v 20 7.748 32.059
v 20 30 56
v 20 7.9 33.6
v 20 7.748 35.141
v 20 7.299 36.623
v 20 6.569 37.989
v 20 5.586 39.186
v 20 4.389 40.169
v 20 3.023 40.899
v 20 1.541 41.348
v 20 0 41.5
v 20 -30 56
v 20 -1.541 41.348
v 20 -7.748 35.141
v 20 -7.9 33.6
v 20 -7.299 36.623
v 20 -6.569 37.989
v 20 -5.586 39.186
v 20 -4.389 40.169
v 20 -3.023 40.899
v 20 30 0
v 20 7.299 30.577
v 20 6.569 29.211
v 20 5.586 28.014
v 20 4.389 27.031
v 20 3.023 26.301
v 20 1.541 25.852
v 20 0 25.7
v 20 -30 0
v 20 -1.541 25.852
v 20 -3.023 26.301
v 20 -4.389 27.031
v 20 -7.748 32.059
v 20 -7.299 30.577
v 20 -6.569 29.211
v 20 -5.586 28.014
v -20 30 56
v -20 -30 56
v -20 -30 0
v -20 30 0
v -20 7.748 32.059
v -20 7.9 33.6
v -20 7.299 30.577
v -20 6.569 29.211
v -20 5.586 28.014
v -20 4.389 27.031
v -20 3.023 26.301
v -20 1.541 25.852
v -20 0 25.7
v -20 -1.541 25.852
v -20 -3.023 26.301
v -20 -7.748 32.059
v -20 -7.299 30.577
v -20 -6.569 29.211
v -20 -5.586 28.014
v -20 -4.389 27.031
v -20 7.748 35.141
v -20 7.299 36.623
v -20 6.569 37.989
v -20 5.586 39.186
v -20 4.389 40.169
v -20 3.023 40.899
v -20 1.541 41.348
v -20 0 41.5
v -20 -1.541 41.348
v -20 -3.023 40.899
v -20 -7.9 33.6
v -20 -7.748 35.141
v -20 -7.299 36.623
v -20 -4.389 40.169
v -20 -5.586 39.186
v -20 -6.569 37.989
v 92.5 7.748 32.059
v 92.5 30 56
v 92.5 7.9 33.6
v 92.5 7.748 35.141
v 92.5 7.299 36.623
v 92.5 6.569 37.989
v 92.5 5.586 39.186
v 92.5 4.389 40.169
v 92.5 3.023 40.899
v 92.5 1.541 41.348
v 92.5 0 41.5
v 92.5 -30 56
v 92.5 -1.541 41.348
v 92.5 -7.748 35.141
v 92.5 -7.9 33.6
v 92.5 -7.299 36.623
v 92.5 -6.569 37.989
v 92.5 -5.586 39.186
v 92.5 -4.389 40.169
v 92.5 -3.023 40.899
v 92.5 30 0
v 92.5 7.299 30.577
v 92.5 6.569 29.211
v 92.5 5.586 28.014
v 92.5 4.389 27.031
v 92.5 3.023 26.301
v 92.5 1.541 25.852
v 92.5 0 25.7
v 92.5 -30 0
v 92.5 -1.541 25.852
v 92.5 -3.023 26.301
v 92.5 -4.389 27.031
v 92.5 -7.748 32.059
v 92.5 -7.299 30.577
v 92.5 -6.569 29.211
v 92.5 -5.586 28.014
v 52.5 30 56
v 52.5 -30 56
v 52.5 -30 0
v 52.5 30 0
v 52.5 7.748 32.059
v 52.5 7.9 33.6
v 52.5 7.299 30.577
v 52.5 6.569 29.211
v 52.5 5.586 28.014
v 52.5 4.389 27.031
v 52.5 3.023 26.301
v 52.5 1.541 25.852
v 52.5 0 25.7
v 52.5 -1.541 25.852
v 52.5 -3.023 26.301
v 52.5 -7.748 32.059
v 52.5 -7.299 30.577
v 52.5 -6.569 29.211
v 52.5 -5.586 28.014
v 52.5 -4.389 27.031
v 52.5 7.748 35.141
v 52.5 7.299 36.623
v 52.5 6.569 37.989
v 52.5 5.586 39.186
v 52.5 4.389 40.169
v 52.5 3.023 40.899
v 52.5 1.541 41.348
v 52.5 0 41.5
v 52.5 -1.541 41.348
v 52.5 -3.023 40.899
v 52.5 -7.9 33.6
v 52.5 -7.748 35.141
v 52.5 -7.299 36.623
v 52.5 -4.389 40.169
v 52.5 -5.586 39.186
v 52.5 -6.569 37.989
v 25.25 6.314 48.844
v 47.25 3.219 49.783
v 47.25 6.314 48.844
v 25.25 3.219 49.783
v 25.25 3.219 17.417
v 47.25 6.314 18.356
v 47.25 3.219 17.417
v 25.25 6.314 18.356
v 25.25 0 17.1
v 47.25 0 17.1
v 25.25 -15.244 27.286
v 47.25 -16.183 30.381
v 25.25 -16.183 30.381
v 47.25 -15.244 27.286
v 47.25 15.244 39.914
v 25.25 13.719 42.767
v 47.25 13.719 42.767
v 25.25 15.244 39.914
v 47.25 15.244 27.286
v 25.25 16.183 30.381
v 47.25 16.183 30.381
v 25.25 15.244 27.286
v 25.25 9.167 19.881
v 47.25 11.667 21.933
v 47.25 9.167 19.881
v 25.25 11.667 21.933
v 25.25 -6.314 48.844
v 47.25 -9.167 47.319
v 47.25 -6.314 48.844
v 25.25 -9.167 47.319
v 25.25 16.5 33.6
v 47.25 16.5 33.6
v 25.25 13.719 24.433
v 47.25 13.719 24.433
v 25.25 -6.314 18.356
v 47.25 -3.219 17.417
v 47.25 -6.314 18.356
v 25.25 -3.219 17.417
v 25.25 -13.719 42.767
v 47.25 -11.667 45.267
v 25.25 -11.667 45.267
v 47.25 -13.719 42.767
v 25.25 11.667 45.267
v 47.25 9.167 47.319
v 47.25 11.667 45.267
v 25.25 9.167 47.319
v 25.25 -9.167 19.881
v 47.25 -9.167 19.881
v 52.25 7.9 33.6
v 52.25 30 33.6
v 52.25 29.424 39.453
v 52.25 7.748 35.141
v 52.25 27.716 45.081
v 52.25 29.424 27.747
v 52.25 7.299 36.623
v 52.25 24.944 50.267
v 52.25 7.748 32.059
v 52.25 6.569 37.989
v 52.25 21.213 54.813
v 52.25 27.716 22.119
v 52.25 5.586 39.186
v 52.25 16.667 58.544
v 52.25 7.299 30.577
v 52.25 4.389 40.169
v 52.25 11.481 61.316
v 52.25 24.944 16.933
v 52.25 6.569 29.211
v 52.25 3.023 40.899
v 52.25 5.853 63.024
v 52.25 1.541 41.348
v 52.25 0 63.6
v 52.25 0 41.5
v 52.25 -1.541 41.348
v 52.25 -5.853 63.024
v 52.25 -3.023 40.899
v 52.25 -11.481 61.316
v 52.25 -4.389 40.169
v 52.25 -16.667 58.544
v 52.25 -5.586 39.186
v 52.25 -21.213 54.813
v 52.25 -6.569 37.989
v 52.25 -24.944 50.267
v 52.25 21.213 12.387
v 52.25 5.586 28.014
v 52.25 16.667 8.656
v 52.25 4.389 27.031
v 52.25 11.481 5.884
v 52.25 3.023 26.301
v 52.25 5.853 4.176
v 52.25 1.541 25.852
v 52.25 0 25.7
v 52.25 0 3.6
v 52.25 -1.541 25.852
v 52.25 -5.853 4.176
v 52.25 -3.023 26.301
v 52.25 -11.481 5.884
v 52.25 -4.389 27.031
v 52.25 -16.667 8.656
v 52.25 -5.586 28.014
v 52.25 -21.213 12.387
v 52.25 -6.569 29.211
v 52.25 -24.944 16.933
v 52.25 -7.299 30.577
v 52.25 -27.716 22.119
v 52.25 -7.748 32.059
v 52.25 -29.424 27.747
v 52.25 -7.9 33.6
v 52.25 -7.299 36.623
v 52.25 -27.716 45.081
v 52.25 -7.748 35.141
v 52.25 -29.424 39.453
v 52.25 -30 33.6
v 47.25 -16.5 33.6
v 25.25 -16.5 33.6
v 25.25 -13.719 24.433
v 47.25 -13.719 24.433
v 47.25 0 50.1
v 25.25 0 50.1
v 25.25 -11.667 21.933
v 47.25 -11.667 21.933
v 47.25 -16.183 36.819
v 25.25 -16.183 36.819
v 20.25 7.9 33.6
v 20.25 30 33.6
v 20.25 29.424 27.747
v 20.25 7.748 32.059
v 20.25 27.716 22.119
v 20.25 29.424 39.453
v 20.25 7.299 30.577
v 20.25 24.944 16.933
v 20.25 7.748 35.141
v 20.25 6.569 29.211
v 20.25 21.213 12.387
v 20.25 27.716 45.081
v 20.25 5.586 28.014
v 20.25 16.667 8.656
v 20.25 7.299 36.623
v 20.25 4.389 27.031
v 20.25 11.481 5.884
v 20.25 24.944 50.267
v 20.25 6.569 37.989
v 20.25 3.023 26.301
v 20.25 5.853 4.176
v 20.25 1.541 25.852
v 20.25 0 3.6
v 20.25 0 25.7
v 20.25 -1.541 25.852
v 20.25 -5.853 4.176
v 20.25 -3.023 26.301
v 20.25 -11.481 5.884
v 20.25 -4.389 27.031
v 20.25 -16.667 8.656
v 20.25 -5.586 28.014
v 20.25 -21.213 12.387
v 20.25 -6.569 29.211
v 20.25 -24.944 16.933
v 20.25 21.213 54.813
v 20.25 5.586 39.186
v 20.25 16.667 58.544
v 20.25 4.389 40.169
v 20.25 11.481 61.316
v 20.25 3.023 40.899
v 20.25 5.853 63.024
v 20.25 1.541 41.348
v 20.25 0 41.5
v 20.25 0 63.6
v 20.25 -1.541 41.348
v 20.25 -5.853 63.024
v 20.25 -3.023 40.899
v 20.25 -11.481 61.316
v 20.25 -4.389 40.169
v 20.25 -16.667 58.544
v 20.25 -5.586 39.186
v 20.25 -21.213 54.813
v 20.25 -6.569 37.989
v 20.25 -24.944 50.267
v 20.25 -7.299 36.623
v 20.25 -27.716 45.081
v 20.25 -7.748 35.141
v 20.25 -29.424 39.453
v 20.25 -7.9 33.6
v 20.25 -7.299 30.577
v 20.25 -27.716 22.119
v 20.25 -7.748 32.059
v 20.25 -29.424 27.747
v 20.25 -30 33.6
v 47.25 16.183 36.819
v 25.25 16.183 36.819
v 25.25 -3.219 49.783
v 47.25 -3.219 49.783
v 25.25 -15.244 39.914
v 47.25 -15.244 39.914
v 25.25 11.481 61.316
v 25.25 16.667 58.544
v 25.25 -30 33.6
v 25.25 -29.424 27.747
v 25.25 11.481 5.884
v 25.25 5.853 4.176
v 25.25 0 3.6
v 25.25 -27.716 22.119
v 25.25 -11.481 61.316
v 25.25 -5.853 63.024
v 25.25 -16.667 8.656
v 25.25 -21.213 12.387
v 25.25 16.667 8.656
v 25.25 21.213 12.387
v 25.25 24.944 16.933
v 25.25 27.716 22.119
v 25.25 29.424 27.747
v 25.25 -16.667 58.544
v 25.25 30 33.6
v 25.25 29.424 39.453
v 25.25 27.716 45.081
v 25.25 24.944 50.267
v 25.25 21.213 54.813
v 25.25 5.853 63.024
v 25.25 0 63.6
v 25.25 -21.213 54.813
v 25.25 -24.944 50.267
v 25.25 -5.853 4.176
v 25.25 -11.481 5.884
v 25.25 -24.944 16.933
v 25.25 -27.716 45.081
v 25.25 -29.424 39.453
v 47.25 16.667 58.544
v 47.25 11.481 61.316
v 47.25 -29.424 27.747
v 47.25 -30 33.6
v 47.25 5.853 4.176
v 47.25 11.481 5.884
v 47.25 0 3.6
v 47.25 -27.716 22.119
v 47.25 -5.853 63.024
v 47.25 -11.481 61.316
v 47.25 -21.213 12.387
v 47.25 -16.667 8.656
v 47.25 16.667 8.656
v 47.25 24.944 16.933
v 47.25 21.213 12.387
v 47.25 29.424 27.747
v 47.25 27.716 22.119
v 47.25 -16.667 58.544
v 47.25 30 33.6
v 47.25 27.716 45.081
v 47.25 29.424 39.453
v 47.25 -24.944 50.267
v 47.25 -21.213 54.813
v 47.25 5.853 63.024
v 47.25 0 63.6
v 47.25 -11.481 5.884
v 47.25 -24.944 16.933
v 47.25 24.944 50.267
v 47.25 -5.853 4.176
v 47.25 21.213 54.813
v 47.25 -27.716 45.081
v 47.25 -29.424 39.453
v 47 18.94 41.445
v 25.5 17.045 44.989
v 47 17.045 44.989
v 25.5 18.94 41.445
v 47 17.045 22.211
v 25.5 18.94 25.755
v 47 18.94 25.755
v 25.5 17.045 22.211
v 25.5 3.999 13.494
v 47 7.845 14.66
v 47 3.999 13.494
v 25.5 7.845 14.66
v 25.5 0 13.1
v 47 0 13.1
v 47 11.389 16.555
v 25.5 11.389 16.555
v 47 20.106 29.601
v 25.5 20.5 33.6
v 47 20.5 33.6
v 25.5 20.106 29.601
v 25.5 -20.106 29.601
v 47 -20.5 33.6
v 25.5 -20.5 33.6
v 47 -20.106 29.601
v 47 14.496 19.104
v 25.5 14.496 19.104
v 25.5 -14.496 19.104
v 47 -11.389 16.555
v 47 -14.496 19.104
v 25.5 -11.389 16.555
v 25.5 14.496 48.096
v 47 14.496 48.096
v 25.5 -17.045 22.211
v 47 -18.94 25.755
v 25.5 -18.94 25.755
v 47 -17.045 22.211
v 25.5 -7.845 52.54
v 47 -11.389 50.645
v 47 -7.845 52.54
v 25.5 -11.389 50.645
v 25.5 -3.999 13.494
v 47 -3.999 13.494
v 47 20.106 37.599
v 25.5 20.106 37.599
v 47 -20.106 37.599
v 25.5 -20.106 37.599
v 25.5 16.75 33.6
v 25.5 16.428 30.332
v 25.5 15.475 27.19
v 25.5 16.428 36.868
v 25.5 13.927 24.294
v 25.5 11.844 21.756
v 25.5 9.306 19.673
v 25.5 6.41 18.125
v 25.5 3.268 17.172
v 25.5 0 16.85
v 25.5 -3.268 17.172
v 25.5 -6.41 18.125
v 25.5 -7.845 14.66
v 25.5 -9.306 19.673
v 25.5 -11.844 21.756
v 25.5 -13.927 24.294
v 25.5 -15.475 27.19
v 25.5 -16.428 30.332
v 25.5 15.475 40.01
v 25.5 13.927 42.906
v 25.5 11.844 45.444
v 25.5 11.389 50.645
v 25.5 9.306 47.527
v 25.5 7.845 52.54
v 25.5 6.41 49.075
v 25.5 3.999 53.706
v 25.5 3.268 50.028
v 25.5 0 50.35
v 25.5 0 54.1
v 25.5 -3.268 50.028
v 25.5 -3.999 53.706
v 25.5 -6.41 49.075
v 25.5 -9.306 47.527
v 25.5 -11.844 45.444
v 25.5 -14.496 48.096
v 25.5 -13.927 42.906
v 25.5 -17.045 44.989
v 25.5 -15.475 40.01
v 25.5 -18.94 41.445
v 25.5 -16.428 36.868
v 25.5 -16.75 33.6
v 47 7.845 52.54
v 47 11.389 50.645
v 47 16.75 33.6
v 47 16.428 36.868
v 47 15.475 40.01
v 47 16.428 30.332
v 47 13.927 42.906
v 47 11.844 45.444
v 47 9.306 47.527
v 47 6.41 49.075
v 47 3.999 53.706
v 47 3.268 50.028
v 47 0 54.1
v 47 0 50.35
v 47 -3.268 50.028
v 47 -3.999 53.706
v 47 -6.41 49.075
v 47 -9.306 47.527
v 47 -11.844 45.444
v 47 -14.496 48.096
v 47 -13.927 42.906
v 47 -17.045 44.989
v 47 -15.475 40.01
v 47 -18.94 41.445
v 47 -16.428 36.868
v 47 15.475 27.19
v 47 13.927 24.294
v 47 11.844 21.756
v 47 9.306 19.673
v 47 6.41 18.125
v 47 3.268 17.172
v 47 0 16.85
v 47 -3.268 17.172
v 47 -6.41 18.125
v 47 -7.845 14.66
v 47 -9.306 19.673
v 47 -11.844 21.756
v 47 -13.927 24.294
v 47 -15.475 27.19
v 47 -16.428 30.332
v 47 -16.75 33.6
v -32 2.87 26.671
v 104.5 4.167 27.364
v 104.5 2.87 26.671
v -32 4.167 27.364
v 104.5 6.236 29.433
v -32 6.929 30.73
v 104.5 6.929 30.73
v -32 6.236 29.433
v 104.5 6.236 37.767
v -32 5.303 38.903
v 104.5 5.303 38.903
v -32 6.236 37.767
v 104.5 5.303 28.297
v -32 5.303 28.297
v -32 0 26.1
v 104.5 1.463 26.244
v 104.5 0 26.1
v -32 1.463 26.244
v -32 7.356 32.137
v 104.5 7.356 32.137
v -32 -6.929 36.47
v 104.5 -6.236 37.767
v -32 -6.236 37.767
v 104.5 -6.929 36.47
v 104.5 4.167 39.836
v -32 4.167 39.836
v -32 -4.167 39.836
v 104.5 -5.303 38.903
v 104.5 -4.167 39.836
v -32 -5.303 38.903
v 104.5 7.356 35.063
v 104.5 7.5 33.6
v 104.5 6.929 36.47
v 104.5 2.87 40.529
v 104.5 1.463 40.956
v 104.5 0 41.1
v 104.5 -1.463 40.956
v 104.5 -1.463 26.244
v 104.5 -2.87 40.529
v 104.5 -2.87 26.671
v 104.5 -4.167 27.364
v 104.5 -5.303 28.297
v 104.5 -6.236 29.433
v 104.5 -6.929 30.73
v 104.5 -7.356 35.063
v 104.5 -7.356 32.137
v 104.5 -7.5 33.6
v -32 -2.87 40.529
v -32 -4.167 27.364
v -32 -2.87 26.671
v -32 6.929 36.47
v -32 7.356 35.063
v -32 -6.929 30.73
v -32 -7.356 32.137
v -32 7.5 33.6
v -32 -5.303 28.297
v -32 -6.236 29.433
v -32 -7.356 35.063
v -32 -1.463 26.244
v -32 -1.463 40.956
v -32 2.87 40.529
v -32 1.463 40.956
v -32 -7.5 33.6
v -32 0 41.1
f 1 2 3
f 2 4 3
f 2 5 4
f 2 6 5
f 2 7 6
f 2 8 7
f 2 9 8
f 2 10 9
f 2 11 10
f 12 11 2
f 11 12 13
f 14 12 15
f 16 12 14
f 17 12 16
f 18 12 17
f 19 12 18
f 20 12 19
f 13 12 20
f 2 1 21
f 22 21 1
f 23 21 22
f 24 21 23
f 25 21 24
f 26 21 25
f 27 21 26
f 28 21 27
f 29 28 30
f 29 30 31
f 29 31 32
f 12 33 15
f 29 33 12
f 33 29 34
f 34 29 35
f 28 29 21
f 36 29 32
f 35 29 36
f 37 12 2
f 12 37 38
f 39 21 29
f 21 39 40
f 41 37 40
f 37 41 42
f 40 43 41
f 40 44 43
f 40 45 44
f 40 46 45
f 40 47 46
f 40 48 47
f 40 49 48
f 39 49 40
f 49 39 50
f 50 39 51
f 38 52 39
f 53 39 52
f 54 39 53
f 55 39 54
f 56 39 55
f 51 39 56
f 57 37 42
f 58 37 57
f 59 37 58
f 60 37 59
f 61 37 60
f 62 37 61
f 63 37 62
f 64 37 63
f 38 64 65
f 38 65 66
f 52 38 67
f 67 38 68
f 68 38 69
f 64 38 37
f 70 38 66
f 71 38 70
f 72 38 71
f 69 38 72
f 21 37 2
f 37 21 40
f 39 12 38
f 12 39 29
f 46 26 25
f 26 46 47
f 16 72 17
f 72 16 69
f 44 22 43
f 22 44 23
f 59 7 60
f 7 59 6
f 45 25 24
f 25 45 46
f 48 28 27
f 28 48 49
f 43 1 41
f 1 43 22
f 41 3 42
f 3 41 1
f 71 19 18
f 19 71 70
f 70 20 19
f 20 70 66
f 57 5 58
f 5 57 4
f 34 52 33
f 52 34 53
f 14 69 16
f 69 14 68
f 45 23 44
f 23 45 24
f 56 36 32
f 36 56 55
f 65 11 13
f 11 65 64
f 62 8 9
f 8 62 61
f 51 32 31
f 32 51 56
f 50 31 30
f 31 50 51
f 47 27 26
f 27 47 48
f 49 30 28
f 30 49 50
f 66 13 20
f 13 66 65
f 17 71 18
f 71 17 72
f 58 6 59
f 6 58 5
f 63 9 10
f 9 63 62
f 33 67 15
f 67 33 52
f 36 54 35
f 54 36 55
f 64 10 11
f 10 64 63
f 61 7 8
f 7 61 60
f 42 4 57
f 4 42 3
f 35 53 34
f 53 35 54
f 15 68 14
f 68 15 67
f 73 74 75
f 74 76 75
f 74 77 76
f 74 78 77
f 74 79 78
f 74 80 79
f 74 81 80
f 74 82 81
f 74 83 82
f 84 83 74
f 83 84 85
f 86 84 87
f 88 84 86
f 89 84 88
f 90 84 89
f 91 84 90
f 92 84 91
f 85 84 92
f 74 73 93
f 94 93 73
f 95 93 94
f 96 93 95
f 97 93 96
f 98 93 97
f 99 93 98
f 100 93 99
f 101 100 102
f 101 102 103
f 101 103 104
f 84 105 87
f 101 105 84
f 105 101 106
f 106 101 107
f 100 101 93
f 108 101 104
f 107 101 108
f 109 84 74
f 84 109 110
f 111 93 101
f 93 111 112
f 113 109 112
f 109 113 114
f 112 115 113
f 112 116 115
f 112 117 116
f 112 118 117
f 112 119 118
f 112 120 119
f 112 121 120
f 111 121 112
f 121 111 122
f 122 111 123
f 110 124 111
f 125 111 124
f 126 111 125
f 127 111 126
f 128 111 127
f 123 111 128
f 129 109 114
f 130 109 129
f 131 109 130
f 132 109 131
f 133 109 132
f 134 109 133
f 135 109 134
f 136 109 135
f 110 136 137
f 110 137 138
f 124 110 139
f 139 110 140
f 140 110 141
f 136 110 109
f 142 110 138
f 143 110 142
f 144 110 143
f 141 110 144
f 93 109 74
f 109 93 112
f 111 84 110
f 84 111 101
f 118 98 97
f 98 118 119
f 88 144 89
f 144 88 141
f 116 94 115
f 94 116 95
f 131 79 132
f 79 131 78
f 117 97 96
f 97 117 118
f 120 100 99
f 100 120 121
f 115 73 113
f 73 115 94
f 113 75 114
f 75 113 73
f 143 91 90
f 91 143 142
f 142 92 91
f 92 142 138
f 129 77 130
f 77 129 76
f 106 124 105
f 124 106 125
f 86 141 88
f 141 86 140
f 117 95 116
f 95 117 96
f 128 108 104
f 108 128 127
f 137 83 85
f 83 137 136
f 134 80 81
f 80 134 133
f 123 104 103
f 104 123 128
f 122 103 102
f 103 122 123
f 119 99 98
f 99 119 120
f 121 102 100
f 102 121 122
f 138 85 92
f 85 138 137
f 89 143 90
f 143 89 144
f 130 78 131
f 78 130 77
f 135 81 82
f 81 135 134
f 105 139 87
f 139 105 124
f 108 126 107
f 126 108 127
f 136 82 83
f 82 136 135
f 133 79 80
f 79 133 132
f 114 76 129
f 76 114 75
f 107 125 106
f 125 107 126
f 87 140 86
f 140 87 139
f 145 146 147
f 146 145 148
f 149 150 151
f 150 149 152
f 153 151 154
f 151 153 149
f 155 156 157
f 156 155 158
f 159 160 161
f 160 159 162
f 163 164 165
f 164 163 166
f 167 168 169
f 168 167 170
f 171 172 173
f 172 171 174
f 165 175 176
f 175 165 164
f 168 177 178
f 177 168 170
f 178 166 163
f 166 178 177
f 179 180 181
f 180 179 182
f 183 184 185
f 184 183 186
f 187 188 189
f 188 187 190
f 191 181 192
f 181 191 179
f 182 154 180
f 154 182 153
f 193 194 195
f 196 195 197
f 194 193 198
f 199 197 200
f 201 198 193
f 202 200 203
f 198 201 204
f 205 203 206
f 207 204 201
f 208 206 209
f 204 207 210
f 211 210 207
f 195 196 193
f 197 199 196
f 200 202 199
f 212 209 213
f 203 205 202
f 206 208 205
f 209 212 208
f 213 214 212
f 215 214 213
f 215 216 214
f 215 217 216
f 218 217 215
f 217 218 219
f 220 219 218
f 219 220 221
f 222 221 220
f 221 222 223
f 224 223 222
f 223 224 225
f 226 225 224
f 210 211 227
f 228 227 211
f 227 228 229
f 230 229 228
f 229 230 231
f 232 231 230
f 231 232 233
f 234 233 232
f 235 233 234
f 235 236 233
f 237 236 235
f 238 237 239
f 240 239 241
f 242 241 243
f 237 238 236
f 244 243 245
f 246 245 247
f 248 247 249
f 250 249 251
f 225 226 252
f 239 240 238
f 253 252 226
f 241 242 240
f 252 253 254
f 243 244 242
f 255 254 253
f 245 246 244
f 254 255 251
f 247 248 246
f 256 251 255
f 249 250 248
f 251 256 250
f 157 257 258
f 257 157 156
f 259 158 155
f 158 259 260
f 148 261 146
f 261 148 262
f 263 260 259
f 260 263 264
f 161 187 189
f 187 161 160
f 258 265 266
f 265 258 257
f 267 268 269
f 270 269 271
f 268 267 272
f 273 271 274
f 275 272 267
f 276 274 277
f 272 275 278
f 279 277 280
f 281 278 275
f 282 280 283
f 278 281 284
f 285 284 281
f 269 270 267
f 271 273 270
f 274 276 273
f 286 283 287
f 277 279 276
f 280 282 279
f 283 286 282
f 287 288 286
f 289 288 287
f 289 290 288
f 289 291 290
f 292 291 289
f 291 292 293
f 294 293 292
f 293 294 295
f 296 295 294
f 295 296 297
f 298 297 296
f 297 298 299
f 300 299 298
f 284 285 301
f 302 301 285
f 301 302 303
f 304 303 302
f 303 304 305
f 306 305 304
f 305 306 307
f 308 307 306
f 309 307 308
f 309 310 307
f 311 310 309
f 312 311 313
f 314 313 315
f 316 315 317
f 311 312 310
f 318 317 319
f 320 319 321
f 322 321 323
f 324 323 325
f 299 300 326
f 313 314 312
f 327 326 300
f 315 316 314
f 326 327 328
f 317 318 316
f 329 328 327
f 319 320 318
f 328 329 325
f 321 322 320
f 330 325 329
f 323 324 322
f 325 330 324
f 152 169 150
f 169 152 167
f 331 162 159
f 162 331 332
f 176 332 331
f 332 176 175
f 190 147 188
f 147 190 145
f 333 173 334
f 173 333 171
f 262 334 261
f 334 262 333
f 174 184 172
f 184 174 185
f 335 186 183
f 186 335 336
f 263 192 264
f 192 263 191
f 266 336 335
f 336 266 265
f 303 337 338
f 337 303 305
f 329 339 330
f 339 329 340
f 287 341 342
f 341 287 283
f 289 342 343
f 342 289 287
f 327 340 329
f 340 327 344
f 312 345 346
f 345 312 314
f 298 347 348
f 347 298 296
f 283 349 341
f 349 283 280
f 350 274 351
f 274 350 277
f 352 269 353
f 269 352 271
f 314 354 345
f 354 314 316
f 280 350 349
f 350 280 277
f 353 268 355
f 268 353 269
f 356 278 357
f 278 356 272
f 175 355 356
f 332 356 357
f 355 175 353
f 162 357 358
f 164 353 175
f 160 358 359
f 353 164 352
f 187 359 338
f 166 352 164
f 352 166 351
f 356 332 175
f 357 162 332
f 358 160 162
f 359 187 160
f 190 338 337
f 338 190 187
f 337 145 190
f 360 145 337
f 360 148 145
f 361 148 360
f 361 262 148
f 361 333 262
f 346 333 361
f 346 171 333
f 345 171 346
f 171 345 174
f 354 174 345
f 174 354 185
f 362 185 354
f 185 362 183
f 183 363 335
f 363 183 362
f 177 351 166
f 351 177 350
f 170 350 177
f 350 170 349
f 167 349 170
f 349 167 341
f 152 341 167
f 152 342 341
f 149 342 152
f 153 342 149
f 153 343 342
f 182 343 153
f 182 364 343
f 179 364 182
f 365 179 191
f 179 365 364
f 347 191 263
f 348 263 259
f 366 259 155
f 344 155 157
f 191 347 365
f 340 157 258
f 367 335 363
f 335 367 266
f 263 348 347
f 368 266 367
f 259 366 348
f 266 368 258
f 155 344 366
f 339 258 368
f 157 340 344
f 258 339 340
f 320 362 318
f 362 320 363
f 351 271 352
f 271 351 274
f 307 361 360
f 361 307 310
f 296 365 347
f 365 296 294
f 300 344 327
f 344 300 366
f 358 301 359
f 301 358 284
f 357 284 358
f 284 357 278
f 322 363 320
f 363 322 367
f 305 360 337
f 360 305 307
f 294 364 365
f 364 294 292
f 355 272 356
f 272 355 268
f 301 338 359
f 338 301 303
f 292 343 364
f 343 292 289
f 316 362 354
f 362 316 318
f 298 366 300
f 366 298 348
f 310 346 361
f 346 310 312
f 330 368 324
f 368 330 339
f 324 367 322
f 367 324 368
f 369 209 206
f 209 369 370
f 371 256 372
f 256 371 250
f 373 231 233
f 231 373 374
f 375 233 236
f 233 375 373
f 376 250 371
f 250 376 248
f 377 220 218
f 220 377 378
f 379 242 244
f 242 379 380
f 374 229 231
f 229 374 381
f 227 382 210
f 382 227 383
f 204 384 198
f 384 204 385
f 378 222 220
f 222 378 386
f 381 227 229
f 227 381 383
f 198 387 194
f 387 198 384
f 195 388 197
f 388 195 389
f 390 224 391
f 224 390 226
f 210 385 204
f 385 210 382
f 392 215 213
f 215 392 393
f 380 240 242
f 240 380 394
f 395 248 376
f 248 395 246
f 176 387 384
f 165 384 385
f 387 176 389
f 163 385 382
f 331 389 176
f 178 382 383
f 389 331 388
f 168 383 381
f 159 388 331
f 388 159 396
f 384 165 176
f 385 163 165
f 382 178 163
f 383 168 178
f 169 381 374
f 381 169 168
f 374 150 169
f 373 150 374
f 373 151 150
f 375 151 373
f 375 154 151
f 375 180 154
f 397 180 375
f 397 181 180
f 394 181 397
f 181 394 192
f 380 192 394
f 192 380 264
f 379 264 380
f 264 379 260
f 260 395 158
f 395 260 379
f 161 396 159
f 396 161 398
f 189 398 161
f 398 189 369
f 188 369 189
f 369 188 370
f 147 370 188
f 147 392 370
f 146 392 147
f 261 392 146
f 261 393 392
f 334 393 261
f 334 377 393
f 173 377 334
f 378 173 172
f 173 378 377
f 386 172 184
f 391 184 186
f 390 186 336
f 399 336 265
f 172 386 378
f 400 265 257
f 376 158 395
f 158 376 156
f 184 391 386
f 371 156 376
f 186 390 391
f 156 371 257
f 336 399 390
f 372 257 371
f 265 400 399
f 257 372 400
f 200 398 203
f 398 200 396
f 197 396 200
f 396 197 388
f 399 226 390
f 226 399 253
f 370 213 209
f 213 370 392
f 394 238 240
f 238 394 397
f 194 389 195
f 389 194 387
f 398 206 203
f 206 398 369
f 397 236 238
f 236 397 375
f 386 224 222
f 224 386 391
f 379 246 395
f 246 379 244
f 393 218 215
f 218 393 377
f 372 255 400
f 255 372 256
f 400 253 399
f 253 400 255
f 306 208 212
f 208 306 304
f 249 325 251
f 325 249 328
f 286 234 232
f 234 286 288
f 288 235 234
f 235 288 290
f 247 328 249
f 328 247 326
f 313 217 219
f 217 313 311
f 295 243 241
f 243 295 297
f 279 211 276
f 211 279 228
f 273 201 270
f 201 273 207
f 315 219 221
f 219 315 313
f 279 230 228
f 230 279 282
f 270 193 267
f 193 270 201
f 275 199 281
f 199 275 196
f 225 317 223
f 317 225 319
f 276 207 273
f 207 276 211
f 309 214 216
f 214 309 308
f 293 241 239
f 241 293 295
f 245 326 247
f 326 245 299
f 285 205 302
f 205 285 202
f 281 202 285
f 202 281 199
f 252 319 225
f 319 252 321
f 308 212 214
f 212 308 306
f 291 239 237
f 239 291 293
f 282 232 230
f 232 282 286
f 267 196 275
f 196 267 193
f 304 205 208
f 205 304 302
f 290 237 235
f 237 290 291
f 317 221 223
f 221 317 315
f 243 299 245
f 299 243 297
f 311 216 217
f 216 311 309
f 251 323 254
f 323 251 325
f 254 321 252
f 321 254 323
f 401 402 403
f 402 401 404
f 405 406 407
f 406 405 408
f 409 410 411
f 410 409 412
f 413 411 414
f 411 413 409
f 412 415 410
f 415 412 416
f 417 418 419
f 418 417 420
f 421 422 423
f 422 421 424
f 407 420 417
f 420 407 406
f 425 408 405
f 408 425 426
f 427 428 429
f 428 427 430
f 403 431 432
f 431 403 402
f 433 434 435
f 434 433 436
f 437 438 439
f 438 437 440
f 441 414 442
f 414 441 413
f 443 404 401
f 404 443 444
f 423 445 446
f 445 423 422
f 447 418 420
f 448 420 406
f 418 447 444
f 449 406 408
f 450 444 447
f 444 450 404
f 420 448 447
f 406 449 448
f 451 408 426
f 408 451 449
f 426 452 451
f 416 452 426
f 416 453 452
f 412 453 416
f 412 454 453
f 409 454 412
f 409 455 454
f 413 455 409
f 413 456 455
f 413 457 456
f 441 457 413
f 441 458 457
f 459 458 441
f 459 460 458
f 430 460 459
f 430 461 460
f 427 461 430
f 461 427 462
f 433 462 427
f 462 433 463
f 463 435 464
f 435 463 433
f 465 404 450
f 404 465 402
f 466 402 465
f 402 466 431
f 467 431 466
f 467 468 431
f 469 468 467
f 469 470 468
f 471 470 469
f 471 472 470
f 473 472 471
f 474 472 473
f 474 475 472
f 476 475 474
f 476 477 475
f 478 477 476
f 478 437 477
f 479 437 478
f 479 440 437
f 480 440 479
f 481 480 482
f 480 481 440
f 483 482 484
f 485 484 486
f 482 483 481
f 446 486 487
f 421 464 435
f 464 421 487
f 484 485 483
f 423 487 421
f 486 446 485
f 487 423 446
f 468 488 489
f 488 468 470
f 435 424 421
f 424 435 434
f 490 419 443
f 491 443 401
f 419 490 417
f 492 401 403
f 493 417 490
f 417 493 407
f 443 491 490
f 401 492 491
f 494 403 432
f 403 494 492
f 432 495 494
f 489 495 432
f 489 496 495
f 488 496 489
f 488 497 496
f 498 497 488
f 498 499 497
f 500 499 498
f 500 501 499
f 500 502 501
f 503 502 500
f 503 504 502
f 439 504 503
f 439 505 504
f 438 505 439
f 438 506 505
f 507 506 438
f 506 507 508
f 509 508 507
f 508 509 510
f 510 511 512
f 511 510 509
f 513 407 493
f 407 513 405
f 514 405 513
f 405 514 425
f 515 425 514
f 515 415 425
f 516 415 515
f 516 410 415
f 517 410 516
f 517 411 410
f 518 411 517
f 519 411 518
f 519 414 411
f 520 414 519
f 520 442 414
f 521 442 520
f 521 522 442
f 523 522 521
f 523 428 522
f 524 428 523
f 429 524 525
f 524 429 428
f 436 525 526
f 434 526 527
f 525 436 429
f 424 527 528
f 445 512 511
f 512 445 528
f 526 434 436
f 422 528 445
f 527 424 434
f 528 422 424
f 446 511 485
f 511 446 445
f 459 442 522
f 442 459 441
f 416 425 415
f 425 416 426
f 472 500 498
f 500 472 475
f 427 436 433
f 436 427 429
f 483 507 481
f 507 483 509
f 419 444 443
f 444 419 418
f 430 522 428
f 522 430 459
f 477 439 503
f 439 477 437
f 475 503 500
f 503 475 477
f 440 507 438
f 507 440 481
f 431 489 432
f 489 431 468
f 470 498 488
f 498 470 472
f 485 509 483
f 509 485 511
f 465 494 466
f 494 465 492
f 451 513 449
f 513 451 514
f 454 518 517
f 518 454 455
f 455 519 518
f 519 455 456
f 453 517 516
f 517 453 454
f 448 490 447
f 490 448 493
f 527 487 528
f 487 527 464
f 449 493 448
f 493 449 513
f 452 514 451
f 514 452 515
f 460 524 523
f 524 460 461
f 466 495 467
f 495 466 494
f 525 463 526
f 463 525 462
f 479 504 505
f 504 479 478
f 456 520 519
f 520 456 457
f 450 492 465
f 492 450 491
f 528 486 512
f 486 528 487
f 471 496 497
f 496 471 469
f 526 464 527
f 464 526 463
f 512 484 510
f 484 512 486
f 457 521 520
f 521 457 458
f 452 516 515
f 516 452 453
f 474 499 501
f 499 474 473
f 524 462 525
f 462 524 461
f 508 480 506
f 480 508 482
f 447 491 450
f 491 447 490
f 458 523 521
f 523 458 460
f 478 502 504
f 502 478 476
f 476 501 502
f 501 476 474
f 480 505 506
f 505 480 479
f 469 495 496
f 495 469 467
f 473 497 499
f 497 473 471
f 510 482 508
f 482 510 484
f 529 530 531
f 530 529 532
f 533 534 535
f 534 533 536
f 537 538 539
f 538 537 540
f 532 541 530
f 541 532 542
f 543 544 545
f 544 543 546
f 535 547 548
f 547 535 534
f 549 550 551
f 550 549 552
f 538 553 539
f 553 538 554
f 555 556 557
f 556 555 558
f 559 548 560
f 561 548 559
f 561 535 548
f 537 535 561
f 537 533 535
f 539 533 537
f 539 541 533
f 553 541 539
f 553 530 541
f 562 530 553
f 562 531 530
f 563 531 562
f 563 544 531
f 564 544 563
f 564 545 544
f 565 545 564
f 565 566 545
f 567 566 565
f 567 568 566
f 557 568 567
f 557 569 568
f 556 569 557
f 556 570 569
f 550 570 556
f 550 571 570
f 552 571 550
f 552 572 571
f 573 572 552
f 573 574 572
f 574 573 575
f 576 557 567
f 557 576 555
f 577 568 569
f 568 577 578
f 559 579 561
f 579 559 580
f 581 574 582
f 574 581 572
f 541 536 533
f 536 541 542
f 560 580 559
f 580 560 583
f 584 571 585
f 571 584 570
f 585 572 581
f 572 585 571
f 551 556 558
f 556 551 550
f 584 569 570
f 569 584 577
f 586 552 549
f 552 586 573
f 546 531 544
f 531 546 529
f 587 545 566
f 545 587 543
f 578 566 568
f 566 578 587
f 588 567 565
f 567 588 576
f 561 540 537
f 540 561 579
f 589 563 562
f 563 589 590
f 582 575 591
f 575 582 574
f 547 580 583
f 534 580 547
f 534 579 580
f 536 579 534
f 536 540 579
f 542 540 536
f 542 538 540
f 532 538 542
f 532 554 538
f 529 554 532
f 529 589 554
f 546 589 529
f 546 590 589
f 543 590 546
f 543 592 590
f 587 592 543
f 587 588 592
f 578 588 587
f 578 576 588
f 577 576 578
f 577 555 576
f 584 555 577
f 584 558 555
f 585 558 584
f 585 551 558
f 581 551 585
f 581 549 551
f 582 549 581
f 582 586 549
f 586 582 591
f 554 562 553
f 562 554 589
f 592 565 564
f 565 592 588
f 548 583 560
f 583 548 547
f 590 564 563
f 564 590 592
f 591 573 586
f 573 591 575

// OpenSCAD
$fn = 32;

// ------------------------------------------------------------------------
// Pulley assembly: d60 pulley with a belt, shaft d15
// Every part is its own module, assembly() places them once.
// ------------------------------------------------------------------------

// --- part 1 ---
module support1() {
  difference() {
    translate([-20, -30, 0]) cube([40, 60, 56]);
    translate([0, 0, 33.6]) rotate([0, 90, 0]) cylinder(h = 42, d = 15.8, center = true);
  }
}

// --- part 2 ---
module support2() {
  difference() {
    translate([-20, -30, 0]) cube([40, 60, 56]);
    translate([0, 0, 33.6]) rotate([0, 90, 0]) cylinder(h = 42, d = 15.8, center = true);
  }
}

// --- part 3 ---
module shaft() {
  translate([0, 0, -68.25]) cylinder(h = 136.5, d = 15);
}

// --- part 4 ---
module pulley() {
  difference() {
    union() {
      cylinder(h = 32, d = 33);
      cylinder(h = 5, d = 60);
      translate([0, 0, 27]) cylinder(h = 5, d = 60);
    }
    translate([0, 0, -1]) cylinder(h = 34, d = 15.8);
  }
}

// --- part 5 ---
module belt() {
  difference() {
      translate([0, 0, 0]) cylinder(h = 21.5, d = 41);
      translate([0, 0, -1]) cylinder(h = 23.5, d = 33.5);
    }
}

// --- assembly ---
module assembly() {
  translate([0, 0, 0]) rotate([0, 0, 0]) support1();
  translate([72.5, 0, 0]) rotate([0, 0, 0]) support2();
  translate([36.25, 0, 33.6]) rotate([0, 90, 0]) shaft();
  translate([20.25, 0, 33.6]) rotate([0, 90, 0]) pulley();
  translate([25.5, 0, 33.6]) rotate([0, 90, 0]) belt();
}

assembly();
